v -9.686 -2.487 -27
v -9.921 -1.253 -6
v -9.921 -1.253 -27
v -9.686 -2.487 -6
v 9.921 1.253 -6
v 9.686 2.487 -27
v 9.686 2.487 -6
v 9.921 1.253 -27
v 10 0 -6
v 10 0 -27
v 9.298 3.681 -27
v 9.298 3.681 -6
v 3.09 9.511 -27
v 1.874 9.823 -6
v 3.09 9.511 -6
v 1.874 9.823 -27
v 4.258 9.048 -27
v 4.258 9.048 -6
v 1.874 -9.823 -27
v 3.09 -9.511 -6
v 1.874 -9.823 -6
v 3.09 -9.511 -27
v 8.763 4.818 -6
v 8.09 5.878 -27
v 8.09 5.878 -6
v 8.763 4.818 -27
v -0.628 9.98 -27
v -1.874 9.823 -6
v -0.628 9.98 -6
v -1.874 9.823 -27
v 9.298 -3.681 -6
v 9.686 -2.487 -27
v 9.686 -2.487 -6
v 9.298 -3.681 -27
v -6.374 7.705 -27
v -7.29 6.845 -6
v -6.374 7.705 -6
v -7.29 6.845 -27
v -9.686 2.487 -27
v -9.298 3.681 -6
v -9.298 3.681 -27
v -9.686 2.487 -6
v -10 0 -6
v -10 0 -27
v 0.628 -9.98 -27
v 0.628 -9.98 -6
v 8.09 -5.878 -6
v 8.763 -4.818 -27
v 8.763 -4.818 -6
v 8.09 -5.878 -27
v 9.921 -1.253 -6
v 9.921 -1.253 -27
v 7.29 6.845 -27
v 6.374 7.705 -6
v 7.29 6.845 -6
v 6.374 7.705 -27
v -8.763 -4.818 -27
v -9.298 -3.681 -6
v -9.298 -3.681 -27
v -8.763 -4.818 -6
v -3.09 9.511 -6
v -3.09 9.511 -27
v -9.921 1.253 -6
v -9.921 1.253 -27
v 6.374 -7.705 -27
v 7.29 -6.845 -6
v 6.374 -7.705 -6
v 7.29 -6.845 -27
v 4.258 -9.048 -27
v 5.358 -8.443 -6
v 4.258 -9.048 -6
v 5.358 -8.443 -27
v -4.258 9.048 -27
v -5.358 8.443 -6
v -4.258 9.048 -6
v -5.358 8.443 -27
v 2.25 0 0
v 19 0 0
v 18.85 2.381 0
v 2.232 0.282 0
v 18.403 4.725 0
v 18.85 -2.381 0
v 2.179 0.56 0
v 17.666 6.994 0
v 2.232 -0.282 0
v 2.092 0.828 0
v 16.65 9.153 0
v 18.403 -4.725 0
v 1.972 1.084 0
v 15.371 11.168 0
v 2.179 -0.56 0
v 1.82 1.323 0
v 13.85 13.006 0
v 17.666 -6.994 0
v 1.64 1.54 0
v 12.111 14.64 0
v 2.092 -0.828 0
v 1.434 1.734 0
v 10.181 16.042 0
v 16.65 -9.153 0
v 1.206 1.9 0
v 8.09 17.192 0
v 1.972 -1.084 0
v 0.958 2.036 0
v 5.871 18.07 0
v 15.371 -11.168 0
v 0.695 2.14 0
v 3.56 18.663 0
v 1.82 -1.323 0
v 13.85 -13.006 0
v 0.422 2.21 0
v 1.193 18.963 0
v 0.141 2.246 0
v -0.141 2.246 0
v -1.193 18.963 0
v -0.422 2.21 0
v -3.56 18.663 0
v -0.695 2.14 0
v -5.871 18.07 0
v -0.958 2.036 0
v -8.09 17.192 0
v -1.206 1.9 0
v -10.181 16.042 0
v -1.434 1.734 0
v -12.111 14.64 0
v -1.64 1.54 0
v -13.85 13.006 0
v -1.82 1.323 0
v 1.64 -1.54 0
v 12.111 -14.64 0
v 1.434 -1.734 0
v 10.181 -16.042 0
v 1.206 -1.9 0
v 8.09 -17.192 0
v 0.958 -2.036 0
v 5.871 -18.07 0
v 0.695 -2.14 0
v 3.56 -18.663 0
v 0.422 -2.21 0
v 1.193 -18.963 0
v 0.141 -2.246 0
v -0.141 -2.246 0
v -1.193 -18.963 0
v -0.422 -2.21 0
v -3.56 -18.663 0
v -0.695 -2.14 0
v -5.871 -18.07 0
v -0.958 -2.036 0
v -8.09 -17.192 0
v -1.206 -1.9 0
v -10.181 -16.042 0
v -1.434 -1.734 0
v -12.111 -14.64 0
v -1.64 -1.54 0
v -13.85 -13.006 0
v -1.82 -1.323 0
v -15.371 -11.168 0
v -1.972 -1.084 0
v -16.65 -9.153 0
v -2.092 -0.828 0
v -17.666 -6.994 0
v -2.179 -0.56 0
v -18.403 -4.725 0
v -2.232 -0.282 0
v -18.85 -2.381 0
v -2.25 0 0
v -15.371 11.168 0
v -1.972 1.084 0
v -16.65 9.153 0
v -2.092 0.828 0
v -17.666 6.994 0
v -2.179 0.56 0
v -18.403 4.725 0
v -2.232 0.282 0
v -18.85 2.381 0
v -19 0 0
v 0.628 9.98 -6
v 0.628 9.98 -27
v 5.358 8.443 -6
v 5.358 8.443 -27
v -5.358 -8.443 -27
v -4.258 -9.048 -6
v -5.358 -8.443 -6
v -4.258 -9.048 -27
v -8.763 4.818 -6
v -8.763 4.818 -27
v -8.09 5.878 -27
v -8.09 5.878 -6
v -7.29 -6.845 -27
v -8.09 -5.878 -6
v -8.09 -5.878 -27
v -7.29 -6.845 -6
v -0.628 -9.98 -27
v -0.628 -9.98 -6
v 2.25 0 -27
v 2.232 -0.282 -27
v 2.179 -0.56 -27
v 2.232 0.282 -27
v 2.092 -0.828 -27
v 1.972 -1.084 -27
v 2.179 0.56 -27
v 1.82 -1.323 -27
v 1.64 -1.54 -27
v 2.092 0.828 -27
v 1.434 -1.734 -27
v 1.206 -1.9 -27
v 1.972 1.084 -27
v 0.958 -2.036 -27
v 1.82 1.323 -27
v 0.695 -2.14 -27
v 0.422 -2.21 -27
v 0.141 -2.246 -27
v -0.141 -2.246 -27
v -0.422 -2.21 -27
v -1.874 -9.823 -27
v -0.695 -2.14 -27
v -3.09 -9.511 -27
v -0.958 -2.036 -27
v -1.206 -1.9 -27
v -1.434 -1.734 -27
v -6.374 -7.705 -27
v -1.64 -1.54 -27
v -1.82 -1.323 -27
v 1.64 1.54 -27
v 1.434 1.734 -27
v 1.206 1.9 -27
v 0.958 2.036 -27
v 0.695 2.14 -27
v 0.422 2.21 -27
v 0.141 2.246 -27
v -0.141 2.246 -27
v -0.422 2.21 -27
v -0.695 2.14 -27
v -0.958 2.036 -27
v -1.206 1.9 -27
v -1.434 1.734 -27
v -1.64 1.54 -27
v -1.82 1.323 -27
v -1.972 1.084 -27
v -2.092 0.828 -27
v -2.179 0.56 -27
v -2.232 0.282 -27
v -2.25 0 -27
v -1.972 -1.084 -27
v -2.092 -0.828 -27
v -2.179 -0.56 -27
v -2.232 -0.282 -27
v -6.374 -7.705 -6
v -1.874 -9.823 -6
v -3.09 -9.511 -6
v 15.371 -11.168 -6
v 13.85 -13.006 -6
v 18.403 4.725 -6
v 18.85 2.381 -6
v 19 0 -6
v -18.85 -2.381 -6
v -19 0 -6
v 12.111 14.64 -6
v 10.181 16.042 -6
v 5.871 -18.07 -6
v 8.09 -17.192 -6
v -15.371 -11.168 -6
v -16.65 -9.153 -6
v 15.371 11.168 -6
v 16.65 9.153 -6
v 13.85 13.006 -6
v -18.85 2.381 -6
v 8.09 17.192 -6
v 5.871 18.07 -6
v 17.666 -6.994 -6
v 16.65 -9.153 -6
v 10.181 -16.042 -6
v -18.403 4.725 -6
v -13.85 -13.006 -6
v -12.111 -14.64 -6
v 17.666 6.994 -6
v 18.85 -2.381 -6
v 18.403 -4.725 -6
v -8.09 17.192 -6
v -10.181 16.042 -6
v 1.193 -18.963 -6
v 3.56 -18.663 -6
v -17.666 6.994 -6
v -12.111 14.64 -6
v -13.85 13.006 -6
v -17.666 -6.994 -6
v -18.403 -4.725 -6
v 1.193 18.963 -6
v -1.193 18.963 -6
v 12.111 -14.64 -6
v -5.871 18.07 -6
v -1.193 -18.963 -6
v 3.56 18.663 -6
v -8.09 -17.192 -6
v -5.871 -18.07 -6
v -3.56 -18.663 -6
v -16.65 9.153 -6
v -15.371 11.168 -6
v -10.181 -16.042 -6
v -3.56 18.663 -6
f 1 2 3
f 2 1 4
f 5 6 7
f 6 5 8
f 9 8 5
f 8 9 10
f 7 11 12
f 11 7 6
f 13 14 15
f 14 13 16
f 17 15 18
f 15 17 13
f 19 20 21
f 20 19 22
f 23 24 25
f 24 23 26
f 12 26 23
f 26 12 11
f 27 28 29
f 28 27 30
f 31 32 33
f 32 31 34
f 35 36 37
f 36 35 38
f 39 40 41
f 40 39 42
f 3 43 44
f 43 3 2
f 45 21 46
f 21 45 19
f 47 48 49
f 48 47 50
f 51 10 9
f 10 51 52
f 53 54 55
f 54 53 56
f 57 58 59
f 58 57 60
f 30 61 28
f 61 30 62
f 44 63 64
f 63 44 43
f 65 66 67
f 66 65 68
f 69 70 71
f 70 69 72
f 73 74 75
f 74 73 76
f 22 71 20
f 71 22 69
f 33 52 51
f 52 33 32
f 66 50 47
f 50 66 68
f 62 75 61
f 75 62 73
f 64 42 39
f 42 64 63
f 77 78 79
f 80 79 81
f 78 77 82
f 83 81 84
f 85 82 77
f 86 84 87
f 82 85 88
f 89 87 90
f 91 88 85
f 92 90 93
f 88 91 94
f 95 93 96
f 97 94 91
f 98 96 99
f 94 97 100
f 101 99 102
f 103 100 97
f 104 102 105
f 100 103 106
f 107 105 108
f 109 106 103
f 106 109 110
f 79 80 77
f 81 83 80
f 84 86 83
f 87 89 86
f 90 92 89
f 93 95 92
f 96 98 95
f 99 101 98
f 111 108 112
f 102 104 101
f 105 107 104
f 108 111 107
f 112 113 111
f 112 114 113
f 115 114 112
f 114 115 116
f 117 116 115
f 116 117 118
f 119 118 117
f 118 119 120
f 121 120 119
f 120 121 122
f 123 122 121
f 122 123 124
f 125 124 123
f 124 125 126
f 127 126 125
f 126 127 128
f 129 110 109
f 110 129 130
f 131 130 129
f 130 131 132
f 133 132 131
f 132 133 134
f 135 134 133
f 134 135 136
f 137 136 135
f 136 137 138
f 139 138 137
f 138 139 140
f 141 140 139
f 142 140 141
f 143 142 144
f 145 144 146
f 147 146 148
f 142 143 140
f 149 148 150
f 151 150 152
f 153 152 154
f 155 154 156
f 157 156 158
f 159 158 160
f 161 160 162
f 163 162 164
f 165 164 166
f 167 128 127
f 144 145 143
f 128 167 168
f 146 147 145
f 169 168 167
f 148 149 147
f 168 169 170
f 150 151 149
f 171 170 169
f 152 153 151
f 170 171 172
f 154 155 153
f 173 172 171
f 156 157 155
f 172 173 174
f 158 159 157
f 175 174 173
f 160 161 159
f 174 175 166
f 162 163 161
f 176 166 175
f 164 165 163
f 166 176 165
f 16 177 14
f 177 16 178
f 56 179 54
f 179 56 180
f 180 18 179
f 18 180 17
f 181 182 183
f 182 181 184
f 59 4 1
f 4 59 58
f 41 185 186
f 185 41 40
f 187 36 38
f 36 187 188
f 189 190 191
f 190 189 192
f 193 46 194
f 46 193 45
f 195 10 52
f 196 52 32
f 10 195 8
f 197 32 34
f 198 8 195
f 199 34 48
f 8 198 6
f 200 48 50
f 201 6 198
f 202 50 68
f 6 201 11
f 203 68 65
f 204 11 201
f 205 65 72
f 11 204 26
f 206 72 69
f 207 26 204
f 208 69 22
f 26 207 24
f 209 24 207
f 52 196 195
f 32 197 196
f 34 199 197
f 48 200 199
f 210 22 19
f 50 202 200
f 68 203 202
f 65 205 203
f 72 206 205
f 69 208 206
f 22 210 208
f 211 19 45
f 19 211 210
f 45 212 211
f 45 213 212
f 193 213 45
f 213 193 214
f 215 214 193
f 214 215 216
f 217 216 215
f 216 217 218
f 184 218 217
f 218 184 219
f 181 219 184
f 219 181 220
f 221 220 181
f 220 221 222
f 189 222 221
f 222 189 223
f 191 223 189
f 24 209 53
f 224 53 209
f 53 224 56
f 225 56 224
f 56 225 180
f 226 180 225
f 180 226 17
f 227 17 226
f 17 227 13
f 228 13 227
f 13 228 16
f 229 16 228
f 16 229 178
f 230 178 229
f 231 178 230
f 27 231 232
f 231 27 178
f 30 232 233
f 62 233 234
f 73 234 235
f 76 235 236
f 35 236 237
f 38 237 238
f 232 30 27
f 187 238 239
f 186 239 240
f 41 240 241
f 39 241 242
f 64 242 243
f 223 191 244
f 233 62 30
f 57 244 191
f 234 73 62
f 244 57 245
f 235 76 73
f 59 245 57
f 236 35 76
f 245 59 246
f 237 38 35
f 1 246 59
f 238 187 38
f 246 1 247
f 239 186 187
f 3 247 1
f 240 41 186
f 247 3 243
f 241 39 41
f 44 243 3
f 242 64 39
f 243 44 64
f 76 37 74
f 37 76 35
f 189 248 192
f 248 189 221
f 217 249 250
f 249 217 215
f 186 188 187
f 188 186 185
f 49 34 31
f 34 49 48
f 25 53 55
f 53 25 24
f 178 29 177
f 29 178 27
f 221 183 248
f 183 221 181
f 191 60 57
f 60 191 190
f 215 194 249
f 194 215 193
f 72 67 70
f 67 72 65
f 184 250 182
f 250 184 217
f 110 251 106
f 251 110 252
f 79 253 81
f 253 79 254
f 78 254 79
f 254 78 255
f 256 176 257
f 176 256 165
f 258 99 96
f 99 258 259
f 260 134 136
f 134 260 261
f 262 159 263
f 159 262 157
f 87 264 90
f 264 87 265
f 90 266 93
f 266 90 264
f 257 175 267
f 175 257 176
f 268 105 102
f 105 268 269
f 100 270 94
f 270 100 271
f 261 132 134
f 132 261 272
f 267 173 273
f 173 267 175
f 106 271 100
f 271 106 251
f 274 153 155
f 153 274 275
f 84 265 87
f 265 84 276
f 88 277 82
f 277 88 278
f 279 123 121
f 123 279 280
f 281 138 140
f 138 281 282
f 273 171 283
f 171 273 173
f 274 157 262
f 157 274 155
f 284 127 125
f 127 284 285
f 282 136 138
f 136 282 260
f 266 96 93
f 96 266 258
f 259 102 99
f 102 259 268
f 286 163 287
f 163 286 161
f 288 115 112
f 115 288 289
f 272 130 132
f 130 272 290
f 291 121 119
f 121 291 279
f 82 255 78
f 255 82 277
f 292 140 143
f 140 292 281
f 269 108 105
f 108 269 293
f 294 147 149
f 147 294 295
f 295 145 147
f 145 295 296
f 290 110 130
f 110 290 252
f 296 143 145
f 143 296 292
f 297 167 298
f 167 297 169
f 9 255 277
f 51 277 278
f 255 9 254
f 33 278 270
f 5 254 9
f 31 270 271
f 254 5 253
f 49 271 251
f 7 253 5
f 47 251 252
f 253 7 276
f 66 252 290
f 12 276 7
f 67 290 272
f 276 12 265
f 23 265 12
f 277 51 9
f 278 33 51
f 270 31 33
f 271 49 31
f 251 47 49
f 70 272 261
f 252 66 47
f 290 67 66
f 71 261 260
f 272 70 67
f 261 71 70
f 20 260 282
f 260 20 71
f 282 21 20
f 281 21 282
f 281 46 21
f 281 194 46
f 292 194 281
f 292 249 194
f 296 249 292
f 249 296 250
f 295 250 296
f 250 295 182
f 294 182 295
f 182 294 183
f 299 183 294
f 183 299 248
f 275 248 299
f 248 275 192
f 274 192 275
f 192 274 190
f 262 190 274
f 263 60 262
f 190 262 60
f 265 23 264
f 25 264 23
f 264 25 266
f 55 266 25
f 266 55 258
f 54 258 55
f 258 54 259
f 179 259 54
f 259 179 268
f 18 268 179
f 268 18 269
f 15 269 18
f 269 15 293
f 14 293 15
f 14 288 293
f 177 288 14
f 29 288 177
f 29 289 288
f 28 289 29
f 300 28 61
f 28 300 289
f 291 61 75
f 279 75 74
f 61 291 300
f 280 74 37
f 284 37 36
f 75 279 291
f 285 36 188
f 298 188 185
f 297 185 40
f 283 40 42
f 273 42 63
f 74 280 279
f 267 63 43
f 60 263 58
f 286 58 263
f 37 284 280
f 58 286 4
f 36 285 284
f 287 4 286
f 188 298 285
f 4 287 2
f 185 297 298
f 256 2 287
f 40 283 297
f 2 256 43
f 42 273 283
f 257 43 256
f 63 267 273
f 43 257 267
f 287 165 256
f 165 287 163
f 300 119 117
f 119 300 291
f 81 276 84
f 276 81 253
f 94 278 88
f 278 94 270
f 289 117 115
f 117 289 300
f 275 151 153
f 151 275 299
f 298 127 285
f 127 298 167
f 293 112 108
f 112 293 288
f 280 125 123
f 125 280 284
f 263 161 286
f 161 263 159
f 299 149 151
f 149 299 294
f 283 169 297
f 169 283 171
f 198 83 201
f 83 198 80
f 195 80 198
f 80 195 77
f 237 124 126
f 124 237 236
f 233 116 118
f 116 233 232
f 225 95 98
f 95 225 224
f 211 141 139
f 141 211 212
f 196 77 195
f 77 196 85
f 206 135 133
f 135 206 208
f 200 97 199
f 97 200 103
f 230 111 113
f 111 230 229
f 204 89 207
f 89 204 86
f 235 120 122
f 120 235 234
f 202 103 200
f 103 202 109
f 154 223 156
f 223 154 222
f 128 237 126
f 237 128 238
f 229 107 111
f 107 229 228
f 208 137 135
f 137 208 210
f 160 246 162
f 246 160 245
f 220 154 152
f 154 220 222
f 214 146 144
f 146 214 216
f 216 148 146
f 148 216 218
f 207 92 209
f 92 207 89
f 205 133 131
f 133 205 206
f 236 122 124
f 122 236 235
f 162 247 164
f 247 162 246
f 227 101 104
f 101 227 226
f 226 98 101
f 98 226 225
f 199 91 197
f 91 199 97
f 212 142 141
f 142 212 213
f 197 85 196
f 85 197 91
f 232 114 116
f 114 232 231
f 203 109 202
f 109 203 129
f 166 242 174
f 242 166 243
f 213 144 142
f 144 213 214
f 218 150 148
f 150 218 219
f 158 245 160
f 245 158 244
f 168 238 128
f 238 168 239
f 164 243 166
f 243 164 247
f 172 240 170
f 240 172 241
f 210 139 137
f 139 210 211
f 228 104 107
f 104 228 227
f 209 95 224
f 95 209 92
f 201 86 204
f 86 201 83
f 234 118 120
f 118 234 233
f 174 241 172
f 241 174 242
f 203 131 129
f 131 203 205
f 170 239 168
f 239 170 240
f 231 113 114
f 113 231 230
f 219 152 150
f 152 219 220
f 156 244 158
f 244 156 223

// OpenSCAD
$fn = 50;


difference() {
	union() {
		translate(v = [0, 0, -27.0000000000]) {
			cylinder(h = 27, r = 10.0000000000);
		}
		translate(v = [0, 0, -6.0000000000]) {
			cylinder(h = 6, r = 19.0000000000);
		}
	}
	union() {
		#translate(v = [0, 0, -27]) {
			cylinder(h = 27, r = 2.2500000000);
		}
	}
}
